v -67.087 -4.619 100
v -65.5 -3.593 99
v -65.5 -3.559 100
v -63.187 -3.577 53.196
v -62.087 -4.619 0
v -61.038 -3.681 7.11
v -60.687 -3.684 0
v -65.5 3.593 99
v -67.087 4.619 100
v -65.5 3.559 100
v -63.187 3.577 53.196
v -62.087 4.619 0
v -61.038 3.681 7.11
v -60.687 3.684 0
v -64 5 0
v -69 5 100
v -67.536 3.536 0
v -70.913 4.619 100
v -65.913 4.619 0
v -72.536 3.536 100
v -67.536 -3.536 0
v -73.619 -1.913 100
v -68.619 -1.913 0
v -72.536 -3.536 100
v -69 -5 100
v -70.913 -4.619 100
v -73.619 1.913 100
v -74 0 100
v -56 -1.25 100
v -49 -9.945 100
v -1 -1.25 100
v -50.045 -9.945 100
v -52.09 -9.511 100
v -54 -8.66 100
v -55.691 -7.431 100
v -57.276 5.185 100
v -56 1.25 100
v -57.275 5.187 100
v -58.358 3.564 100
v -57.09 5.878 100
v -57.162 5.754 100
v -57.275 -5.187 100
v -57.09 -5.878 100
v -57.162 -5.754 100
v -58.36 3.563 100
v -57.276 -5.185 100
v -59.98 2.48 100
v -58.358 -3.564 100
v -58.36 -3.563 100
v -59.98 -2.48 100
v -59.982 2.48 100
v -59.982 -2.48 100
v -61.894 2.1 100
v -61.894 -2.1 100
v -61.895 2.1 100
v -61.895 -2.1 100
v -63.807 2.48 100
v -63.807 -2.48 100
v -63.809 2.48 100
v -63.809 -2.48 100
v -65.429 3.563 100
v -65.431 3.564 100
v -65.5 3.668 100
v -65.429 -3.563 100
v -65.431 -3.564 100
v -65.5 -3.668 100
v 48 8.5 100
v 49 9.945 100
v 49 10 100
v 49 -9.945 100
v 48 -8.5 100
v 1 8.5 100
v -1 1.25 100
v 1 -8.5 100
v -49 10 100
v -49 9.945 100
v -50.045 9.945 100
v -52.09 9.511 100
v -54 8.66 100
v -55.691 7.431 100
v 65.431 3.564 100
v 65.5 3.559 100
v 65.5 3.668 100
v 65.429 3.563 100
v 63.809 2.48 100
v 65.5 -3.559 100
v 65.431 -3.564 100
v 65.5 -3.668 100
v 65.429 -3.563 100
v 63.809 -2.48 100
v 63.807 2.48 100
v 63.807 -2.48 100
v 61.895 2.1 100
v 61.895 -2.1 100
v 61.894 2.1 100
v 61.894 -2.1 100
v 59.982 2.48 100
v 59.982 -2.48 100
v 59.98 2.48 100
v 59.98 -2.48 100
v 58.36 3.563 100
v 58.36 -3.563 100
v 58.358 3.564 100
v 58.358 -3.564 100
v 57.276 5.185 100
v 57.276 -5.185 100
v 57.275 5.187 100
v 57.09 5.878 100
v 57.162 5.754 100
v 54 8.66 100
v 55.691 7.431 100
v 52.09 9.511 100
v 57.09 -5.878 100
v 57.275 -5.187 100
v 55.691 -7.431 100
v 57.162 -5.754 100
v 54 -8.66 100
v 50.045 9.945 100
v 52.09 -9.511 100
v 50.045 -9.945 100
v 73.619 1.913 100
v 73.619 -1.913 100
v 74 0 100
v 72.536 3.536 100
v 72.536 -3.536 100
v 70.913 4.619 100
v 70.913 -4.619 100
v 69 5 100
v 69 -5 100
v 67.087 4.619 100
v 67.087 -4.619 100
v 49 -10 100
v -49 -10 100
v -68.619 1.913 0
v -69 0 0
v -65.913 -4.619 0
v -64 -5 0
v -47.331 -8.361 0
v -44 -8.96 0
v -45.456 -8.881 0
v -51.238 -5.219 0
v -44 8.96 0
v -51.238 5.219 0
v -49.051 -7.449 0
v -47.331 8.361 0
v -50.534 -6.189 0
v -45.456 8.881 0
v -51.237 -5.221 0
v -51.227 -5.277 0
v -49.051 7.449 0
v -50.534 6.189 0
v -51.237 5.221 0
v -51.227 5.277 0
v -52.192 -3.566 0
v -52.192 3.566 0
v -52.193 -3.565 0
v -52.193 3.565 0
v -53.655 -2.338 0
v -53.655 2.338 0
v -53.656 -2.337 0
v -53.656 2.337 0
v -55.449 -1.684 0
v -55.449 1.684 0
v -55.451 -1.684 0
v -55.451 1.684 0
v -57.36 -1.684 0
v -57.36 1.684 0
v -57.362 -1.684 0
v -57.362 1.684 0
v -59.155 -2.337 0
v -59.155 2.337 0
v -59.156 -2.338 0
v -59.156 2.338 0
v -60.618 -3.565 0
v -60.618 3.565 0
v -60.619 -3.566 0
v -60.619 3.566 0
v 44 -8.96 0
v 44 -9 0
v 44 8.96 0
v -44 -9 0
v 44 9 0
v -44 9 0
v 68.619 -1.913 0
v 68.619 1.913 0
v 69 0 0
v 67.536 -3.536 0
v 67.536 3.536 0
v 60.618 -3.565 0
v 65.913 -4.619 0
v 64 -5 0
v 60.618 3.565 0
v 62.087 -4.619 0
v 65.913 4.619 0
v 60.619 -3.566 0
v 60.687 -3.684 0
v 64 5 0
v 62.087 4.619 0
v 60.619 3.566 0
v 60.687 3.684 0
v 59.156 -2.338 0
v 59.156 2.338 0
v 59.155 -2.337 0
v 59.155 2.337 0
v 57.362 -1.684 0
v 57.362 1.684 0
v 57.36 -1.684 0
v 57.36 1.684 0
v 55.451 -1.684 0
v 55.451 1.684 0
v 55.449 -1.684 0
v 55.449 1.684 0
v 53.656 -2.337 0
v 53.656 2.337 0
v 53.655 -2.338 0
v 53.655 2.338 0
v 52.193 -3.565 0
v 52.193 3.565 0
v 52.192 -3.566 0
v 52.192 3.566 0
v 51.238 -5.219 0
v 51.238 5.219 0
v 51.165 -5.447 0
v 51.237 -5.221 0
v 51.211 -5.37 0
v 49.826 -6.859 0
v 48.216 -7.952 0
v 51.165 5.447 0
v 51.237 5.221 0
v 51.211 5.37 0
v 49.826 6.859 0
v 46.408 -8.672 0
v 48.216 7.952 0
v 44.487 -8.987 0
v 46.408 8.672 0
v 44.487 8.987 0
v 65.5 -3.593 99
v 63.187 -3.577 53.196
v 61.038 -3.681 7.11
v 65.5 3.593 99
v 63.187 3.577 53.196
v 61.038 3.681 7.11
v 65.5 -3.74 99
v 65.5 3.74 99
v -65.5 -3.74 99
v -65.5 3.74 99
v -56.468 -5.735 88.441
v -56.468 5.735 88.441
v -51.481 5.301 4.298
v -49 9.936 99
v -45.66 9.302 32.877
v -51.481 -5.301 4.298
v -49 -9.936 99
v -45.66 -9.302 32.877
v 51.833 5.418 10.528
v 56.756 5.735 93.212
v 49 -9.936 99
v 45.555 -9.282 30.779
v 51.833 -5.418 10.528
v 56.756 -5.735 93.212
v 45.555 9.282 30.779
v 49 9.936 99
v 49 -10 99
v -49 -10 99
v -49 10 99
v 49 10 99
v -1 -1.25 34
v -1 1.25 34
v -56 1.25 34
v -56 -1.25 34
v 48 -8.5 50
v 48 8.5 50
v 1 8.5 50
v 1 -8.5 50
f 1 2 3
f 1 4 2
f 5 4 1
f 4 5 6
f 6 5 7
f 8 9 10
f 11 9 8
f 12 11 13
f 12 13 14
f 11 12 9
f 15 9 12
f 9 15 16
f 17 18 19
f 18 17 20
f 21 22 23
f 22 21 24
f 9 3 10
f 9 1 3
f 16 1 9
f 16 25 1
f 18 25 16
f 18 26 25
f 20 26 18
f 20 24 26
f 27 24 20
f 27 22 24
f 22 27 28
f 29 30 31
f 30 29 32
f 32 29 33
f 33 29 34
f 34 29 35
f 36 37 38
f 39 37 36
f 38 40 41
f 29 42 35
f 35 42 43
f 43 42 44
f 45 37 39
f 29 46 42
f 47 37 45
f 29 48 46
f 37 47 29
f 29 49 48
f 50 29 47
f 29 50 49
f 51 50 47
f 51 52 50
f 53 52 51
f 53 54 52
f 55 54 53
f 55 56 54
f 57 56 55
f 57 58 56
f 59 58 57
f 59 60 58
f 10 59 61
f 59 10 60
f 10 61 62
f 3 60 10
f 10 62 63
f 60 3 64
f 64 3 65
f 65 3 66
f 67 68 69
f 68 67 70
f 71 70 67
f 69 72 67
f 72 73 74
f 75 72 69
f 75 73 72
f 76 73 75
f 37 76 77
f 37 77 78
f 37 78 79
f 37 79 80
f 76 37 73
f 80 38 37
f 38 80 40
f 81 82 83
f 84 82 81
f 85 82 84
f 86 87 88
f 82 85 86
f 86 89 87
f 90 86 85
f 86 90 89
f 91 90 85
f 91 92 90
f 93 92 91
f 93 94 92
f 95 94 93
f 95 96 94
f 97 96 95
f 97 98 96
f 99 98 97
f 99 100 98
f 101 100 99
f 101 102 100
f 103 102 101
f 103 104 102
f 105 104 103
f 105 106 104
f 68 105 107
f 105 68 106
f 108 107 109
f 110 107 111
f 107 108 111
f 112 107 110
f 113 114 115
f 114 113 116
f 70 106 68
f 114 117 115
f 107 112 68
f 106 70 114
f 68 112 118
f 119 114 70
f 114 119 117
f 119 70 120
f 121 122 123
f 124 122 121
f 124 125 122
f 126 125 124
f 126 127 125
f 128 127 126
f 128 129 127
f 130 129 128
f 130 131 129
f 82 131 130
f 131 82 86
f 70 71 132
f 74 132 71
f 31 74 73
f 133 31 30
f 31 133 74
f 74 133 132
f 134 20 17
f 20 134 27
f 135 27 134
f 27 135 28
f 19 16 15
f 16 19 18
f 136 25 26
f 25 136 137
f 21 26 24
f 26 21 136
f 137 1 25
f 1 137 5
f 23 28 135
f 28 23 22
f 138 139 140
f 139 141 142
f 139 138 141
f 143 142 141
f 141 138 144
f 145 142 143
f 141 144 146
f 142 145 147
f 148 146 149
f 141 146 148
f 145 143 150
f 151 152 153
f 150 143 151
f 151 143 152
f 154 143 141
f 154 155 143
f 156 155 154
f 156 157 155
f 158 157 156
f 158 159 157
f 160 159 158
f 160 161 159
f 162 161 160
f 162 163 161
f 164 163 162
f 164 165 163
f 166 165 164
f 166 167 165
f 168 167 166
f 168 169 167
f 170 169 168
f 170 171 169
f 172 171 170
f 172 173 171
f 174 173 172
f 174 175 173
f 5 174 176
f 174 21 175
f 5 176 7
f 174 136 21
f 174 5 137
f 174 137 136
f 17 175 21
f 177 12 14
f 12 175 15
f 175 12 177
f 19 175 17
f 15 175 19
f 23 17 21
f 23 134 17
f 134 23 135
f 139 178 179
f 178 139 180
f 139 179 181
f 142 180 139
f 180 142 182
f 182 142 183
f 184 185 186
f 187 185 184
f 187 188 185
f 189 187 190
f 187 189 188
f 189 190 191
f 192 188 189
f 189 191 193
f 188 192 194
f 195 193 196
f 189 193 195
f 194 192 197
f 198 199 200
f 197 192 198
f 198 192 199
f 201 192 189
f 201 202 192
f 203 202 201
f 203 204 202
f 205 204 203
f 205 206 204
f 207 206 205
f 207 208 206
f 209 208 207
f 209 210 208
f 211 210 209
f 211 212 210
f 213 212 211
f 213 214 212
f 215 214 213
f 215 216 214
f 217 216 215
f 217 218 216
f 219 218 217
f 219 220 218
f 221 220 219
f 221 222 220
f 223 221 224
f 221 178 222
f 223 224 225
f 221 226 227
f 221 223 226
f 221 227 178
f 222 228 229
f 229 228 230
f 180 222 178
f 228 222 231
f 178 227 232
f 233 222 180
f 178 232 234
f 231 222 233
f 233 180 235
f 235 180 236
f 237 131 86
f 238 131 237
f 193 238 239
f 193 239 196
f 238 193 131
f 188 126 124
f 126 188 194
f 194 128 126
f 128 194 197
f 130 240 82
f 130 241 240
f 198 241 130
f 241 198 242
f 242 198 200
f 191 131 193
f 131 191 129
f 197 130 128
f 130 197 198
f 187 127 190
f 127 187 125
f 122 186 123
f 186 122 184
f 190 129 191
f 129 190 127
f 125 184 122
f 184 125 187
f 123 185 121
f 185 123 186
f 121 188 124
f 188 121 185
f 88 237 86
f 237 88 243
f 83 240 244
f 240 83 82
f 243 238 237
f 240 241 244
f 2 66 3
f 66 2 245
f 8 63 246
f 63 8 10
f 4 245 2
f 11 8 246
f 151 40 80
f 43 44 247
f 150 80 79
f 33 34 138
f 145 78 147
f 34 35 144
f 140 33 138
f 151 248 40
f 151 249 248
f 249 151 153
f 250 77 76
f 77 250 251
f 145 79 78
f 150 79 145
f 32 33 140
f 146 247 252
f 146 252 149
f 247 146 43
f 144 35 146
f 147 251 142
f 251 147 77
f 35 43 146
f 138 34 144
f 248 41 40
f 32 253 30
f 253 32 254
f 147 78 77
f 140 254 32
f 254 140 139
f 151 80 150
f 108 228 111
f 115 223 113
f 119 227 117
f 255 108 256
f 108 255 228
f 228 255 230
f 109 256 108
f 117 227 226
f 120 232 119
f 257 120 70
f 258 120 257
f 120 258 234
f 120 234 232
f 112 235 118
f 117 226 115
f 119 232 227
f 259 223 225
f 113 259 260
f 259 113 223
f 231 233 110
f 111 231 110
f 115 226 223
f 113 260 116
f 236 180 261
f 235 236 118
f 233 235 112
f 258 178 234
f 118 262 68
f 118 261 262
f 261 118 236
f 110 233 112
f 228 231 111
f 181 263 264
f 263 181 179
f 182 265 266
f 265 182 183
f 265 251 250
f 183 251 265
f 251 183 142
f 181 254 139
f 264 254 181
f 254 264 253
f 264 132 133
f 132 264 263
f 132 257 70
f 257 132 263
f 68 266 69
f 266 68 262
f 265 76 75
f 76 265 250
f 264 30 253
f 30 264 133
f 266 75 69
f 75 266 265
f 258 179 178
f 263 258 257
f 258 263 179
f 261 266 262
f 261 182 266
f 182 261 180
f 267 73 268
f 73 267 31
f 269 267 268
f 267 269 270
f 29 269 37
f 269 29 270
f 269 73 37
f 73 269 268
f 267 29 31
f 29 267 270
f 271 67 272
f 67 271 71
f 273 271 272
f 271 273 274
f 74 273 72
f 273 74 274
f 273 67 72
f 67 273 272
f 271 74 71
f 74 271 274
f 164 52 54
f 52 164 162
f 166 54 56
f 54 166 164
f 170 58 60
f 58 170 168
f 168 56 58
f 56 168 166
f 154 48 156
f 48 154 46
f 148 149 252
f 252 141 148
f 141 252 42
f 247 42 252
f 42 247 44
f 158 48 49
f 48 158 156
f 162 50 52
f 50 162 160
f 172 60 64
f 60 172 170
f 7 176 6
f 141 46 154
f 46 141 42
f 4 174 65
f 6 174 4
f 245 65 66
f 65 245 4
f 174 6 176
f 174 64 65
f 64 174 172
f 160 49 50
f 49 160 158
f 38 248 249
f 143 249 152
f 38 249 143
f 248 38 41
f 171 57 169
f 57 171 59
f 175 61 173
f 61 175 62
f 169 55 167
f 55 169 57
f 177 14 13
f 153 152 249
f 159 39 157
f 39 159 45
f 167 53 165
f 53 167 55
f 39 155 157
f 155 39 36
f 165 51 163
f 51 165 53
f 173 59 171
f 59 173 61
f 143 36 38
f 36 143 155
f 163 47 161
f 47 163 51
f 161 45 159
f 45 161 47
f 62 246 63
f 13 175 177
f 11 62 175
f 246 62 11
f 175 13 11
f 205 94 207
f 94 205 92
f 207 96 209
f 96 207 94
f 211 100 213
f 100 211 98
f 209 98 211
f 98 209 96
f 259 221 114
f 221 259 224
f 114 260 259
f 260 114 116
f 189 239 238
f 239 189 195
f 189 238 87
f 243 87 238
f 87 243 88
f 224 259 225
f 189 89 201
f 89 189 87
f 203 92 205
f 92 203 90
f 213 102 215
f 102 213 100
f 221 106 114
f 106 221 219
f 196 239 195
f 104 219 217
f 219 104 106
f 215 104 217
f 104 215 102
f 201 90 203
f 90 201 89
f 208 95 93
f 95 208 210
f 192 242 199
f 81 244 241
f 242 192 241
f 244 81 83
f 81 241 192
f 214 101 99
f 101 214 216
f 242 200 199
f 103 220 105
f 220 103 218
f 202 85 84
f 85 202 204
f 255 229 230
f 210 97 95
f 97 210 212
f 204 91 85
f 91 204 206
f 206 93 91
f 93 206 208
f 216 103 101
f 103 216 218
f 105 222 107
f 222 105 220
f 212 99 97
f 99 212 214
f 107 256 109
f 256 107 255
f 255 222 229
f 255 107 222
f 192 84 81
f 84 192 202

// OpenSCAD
// Tesla model S center console insert holder
// v1.3
//
// Supports up to 104mm width of inserts, depending on depth
// 
// Current configuration:
// 1. Parking garage cardkey
// 2. Garage door opener

insert_1_width = 55.0;
insert_1_depth = 2.5;
insert_1_height = 81.0;
insert_1_height_exposed = 15.0;

insert_2_width = 47.0;
insert_2_depth = 17.0;
insert_2_height = 78.0;
insert_2_height_exposed = 28.0;

// These you'll want to set empirically based on how deep your two offsets are
insert_1_offset = -56.0;
insert_2_offset = 1.0;

holder_height = 100.0;


difference() {
    union() {
        // End circles
        SkewedCylinder(c1=[-64,0,0], r1=5, c2=[-5,0,holder_height], r2=5);
        SkewedCylinder(c1=[64,0,0], r1=5, c2=[5,0,holder_height], r2=5);
        
        // Narrow core
        translate([-60.5,-4,0]) {
            hull() {
                cube([121,8,1]);
                translate([-5, 0, holder_height-1]) {
                    cube([131,8,1]);
                }
            }
        }

        // Narrow-fat transition
        SkewedCylinder(c1=[-44,0,0], r1=9, c2=[-5,0,holder_height], r2=10);
        SkewedCylinder(c1=[44,0,0], r1=9, c2=[5,0,holder_height], r2=10);

        // Fat core
        translate([-44,-9,0]) {
            hull() {
                cube([88,18,1]);
                translate([-5, -1, holder_height-1]) {
                    cube([98,20,1]);
                }
            }
        }
    }
    
    // Insert 1
    translate([insert_1_offset,-insert_1_depth/2,holder_height-insert_1_height+insert_1_height_exposed]) {
        cube([insert_1_width, insert_1_depth, insert_1_height]);
    }
    
    // Insert 2
    translate([insert_2_offset,-insert_2_depth/2,holder_height-insert_2_height+insert_2_height_exposed]) {
        cube([insert_2_width, insert_2_depth, insert_2_height]);
    }
    
    // Style! (Cutouts from end circles to fat core)
    SkewedCylinder(c1=[-56.4,-7.1,-0.1], r1=5.5, c2=[-5.5,0,holder_height+0.2], r2=5);
    SkewedCylinder(c1=[-56.4,7.1,-0.1], r1=5.5, c2=[-5.5,0,holder_height+0.2], r2=5);
    SkewedCylinder(c1=[56.4,-7.1,-0.1], r1=5.5, c2=[5.5,0,holder_height+0.2], r2=5);
    SkewedCylinder(c1=[56.4,7.1,-0.1], r1=5.5, c2=[5.5,0,holder_height+0.2], r2=5);
}

module SkewedCylinder(c1=[0,0,0],r1,c2,r2)
{
    h = c2[2];
    offset = [c2[0], c2[1], h-0.1];
    translate(c1) {
        hull() {
            cylinder(r1=r1, r2=0, h=0.1);
            translate(offset) {
                cylinder(r1=0, r2=r2, h=0.1);
            }
        }
    }
}
